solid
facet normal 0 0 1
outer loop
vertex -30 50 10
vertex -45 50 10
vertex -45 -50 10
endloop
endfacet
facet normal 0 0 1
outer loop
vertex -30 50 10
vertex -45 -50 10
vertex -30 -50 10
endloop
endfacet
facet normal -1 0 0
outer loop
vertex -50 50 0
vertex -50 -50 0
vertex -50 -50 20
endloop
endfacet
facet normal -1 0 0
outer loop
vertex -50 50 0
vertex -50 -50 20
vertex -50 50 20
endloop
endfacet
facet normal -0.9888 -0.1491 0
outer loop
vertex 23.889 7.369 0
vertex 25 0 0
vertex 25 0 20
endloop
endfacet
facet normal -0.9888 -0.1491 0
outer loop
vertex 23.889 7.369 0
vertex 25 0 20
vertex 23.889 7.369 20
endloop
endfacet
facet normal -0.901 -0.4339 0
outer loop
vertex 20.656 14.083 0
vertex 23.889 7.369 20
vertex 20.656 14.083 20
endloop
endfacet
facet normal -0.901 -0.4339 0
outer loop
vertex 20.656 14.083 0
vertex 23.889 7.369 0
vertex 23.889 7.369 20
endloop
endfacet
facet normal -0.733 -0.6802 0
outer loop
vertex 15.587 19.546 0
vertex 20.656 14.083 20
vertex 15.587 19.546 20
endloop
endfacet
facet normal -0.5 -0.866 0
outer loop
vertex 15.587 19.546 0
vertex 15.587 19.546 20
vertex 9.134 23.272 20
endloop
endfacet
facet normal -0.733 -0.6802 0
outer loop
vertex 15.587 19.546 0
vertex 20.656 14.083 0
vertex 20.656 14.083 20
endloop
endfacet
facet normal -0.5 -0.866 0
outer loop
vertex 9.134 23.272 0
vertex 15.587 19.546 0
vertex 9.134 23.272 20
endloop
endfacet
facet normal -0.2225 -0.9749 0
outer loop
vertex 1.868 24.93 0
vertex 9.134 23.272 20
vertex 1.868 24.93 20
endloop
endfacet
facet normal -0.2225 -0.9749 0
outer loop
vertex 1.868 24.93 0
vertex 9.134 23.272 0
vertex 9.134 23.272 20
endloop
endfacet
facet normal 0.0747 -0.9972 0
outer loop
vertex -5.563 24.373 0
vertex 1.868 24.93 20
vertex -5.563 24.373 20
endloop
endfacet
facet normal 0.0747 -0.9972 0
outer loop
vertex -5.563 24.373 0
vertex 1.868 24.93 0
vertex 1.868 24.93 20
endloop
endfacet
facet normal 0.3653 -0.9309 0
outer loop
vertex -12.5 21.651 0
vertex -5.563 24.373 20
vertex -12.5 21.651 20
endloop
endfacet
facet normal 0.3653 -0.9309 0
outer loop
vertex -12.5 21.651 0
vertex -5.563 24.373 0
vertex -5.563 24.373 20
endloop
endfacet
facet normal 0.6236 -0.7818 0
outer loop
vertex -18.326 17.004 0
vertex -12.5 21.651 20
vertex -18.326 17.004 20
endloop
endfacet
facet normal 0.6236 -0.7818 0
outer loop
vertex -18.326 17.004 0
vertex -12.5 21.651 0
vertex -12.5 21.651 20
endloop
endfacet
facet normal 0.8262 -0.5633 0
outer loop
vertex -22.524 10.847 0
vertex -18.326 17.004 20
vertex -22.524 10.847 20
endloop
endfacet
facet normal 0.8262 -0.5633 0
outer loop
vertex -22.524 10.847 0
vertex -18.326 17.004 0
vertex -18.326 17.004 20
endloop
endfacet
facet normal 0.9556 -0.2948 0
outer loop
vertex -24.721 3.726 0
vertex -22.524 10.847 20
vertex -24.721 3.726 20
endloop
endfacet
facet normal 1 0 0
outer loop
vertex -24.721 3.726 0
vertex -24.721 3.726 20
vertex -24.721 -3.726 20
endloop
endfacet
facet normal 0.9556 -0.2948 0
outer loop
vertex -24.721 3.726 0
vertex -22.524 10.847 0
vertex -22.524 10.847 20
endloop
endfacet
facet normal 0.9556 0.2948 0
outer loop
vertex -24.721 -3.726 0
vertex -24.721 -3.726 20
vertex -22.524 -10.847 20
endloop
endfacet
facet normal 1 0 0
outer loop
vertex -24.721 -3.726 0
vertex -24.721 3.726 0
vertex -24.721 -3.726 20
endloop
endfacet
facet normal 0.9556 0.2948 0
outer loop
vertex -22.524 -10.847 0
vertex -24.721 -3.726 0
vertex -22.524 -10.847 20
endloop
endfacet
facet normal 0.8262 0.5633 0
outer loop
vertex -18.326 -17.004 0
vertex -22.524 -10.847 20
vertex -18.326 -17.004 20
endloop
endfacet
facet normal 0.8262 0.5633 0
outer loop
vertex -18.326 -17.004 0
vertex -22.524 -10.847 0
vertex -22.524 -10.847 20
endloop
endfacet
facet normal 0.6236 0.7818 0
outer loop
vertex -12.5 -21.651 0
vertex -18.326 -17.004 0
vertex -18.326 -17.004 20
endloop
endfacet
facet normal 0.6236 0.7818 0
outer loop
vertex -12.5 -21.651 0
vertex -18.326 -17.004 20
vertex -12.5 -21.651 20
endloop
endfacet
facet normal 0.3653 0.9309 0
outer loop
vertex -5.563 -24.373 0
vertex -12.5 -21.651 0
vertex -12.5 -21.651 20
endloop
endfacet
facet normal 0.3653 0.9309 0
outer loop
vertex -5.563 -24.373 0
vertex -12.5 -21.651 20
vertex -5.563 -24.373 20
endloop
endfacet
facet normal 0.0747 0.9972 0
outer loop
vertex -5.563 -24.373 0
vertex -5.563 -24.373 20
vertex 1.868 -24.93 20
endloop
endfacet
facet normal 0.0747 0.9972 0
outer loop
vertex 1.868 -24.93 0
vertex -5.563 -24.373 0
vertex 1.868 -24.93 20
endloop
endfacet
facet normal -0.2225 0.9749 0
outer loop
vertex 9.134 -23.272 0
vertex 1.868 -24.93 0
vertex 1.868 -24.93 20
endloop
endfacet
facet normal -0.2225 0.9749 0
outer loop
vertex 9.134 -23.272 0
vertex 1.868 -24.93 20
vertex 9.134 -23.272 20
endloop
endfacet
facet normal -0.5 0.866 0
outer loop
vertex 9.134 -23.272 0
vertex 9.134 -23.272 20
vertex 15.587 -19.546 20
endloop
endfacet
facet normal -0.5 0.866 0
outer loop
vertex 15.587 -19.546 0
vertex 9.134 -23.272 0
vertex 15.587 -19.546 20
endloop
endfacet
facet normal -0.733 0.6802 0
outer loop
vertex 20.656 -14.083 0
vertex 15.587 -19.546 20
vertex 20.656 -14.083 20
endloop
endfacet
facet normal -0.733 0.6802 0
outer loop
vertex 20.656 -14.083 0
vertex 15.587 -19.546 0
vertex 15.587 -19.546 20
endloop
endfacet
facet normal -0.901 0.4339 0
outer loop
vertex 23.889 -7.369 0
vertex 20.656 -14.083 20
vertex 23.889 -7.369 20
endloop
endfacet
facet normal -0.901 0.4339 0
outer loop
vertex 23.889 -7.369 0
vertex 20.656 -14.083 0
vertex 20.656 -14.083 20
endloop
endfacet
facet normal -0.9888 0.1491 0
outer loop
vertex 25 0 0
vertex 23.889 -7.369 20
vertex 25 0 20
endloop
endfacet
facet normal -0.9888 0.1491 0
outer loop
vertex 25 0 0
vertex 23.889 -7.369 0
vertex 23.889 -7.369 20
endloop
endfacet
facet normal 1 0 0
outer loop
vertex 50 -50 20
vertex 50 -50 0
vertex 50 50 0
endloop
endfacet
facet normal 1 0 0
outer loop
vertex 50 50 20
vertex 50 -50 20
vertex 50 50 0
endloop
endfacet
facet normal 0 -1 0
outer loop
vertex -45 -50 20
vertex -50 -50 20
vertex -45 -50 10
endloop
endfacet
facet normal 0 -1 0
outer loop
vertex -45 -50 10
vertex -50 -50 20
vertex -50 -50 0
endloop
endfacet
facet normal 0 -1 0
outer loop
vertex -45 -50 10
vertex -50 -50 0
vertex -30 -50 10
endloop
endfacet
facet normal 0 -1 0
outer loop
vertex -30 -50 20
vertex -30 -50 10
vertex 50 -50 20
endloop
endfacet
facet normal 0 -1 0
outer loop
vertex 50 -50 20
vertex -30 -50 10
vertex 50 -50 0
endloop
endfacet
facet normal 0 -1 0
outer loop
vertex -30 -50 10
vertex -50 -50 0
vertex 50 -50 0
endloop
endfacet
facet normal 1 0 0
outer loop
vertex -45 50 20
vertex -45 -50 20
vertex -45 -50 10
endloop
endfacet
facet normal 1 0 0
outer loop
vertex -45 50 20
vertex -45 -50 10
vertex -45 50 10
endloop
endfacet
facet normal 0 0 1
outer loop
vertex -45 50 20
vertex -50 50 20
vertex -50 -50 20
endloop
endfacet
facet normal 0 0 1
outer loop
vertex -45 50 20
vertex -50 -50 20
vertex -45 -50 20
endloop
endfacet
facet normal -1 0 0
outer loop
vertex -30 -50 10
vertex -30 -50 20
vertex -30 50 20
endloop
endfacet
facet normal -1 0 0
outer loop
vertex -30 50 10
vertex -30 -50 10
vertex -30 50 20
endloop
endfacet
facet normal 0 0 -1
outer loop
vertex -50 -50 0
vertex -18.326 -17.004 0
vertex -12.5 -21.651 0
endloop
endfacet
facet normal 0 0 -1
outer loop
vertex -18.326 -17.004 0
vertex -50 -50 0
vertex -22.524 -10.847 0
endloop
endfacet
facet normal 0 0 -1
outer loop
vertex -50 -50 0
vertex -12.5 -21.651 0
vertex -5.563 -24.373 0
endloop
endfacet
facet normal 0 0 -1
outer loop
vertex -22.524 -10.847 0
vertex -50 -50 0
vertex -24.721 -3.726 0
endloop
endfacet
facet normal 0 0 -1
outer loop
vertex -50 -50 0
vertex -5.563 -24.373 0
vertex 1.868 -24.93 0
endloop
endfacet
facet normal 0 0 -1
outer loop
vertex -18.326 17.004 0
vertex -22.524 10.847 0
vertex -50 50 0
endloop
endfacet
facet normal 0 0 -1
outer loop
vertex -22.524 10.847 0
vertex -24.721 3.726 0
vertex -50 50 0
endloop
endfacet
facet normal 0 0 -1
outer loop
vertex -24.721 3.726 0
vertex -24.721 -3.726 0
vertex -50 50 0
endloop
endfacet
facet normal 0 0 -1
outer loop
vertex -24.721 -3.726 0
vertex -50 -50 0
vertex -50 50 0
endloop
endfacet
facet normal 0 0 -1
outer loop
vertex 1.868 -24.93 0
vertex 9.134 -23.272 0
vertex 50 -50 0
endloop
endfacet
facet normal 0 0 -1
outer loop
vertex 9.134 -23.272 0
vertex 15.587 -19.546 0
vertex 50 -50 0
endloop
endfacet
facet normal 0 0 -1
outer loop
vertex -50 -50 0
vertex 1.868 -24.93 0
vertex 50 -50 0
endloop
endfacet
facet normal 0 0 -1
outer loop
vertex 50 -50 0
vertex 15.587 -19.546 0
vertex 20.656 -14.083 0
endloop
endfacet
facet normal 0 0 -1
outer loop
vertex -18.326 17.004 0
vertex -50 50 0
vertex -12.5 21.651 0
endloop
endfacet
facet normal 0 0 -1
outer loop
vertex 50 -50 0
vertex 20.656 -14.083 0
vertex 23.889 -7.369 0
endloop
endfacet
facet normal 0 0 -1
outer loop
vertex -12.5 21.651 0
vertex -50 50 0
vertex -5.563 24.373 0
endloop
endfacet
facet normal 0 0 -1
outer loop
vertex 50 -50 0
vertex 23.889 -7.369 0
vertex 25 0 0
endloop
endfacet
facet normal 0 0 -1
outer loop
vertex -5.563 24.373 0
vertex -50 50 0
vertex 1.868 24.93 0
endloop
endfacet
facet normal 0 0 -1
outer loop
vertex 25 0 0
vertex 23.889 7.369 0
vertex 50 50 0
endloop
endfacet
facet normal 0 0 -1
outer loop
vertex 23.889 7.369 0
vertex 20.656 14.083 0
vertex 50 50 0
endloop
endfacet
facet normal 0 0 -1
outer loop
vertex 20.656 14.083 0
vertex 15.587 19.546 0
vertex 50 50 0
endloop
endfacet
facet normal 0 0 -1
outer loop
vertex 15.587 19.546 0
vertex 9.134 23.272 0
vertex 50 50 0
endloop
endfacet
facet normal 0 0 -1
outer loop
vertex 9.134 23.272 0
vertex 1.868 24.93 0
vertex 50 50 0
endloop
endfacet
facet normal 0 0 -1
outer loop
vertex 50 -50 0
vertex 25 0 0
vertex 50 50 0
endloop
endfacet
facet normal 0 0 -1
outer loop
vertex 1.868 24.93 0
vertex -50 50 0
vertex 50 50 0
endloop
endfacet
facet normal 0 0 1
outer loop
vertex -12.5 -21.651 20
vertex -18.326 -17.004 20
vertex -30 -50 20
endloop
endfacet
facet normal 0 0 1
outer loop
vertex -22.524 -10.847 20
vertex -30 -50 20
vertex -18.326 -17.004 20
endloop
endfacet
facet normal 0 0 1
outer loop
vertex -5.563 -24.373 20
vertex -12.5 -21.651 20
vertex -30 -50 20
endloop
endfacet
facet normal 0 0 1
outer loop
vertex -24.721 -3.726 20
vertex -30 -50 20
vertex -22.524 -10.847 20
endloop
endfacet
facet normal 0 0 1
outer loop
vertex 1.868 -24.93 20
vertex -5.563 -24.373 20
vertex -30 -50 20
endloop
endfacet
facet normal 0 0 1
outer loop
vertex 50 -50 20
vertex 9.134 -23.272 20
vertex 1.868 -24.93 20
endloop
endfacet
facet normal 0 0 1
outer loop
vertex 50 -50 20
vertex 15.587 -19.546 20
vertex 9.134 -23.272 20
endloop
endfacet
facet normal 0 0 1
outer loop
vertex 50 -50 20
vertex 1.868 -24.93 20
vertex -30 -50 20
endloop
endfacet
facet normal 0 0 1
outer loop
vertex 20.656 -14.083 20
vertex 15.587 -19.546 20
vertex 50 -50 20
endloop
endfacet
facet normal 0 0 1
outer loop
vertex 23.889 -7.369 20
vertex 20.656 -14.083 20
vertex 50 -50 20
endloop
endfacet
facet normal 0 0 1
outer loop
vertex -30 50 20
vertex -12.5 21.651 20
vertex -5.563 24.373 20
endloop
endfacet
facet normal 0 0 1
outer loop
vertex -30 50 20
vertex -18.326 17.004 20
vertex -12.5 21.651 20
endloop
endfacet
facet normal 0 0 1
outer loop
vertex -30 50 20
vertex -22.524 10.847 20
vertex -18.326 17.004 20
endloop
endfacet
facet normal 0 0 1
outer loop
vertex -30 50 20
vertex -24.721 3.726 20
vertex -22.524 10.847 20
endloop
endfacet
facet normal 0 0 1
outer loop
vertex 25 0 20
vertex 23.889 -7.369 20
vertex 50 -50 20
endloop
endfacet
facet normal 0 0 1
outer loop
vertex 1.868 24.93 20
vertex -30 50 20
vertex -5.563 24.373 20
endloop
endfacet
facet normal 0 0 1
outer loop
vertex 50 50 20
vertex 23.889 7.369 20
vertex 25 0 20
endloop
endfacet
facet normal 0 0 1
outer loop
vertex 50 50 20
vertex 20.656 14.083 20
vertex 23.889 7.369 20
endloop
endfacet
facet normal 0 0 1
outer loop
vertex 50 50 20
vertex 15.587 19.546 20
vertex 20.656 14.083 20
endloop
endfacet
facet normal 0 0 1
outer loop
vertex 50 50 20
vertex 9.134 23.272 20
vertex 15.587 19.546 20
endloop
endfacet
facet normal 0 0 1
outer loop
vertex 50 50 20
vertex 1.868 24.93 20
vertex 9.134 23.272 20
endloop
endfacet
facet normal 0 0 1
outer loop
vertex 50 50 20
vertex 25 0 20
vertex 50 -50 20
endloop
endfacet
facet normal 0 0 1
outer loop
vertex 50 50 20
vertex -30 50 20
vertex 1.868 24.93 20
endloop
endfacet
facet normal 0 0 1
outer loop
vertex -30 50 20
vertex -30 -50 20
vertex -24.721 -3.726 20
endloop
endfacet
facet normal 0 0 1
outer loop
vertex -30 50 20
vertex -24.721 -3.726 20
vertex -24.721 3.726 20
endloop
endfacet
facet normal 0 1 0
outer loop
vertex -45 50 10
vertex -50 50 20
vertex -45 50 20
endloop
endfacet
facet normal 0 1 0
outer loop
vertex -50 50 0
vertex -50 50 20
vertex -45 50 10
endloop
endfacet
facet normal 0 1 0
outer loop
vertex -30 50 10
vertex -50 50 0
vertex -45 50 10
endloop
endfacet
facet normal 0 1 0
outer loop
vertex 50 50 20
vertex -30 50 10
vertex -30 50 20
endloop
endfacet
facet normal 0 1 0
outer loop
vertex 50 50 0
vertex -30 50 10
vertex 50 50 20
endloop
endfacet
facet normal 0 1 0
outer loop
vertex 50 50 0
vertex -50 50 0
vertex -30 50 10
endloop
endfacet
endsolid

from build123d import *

# Parameters (mm, degrees)
F1_W     = 100
F1_H     = 100
F1_R     = 25
F2_DEPTH = 20
F3_W     = 15
F3_H     = 100
F4_DEPTH = 10


with BuildPart() as f2:
    # F1 (on face) → F2 (new body)
    with BuildSketch(Plane.XY):
        Rectangle(F1_W, F1_H)
        Circle(F1_R, mode=Mode.SUBTRACT)
    extrude(amount=F2_DEPTH)

    # F3 (on face) → F4 (cut)
    with BuildSketch(Plane.XY.offset(20)):
        with Locations((-37.5, 0)):
            Rectangle(F3_W, F3_H)
    extrude(amount=-F4_DEPTH, mode=Mode.SUBTRACT)


solid = f2.part
